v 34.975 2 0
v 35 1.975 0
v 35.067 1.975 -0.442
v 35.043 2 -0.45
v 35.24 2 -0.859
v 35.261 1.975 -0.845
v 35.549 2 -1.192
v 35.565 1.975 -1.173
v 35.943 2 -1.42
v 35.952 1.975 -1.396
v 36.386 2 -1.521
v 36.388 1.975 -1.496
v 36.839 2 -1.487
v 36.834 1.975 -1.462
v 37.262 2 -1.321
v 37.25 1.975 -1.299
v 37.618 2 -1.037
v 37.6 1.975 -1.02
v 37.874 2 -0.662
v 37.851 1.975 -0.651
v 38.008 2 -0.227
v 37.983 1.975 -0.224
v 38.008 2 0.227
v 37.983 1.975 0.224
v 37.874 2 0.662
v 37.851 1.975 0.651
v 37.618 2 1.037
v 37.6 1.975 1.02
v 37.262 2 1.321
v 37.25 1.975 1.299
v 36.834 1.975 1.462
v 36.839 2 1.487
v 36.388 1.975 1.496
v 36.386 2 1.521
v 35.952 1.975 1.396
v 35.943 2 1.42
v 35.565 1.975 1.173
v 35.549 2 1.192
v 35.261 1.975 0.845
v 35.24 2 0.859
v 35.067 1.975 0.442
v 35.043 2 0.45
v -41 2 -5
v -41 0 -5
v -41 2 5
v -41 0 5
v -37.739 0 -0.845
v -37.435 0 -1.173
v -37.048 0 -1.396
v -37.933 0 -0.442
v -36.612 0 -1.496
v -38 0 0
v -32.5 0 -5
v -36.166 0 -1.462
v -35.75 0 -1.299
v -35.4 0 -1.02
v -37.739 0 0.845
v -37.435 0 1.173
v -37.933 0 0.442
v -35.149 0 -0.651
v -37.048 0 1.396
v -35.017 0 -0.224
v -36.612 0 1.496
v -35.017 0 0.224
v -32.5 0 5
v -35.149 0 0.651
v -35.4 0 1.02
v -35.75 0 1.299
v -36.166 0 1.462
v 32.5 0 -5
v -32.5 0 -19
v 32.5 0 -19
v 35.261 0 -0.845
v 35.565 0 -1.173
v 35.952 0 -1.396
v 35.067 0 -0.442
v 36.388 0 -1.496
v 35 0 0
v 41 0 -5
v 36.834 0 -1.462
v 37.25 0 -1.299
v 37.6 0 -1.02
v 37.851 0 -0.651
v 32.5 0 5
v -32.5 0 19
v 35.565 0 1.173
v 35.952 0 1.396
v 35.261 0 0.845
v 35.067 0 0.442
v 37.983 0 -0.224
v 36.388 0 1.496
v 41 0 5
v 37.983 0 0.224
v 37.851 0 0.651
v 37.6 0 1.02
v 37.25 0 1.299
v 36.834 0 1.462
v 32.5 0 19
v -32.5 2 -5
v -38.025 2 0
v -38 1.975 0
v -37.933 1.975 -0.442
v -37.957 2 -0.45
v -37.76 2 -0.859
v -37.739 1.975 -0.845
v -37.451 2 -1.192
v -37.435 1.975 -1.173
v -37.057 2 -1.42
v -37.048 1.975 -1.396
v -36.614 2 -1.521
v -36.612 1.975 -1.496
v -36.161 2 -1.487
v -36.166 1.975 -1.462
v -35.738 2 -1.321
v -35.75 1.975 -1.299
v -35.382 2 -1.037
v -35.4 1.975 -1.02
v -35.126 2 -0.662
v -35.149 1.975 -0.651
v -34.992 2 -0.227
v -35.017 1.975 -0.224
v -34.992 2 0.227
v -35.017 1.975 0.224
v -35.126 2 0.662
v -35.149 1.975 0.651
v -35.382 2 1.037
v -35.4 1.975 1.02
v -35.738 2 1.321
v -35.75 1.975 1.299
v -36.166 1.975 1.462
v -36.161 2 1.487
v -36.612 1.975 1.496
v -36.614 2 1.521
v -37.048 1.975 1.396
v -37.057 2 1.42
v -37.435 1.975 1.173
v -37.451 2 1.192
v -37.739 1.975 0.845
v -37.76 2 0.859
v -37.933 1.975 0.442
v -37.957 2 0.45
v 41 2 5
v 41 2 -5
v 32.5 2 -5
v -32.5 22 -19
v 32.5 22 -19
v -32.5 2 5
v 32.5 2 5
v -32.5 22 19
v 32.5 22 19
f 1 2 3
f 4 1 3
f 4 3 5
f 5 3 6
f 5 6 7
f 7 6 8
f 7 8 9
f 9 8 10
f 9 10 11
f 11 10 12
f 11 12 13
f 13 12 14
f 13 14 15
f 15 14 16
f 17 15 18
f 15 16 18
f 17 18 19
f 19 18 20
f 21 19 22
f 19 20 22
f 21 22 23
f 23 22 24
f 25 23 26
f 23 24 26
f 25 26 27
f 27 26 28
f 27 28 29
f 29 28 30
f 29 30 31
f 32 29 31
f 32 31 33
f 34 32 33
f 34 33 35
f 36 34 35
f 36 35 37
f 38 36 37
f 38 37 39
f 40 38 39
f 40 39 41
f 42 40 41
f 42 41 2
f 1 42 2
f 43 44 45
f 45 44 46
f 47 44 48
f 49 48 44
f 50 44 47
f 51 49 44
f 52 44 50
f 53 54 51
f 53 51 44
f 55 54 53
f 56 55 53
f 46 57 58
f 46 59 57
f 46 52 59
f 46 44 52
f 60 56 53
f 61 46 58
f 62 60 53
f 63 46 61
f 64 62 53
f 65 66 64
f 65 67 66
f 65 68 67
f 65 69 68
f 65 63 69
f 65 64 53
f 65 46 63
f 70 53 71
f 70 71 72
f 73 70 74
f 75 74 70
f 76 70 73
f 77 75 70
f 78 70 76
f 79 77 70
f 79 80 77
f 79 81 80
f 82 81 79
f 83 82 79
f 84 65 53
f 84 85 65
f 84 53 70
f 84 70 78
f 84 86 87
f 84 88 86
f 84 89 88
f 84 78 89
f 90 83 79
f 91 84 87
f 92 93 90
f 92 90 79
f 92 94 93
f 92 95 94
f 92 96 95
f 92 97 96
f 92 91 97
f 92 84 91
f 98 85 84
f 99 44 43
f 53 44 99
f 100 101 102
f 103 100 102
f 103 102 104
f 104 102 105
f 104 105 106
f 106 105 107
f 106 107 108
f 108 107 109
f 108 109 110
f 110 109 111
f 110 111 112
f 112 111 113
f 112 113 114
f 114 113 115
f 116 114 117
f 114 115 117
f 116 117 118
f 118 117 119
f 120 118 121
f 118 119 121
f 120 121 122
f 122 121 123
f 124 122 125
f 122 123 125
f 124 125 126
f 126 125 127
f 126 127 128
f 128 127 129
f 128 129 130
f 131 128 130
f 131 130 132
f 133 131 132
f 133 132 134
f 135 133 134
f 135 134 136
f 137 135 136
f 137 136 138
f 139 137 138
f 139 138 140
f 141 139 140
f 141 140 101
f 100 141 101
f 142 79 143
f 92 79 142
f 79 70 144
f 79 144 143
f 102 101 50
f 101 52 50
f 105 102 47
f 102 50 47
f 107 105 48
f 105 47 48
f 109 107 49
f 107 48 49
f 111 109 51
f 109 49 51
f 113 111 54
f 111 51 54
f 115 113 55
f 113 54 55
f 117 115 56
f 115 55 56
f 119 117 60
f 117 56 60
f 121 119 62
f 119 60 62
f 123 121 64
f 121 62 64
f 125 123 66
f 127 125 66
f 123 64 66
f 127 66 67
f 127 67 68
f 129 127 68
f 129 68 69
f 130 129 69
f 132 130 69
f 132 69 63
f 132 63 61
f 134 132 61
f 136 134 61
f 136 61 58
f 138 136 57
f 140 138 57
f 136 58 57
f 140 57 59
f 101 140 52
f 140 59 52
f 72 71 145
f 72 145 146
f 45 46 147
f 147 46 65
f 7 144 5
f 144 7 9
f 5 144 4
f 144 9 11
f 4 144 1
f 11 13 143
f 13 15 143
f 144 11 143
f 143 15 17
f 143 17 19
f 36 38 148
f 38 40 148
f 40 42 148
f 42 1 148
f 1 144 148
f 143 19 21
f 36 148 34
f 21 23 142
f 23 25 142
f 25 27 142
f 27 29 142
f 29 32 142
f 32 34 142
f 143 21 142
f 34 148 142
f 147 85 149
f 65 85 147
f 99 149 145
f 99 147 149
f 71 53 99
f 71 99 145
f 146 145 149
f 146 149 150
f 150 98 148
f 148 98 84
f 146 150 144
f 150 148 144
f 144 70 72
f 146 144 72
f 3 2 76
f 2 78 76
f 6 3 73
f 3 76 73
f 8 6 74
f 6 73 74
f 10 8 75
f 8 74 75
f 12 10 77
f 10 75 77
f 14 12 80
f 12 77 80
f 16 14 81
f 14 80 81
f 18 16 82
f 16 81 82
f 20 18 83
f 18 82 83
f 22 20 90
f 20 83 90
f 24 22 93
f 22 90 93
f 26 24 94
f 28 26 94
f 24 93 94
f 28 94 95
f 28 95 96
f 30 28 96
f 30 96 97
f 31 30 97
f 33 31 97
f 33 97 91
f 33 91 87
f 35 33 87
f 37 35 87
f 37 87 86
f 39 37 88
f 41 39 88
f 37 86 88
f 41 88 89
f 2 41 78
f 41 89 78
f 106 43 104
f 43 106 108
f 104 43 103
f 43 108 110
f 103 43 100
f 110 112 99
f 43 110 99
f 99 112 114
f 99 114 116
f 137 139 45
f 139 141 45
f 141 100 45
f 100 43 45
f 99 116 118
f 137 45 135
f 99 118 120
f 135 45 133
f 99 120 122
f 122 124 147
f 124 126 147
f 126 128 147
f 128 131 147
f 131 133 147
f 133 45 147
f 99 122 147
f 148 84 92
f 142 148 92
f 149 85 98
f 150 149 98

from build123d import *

# Parameters (mm, degrees)
SKETCH1_W                          = 65
SKETCH1_H                          = 38
BOSS_EXTRUDE1_DEPTH                = 22
SKETCH2_W                          = 82
SKETCH2_H                          = 10
BOSS_EXTRUDE2_DEPTH                = 2
F_3_0_3_DIAMETER_HOLE1_D           = 3
F_3_0_3_DIAMETER_HOLE1_CSINK_D     = 3.05
F_3_0_3_DIAMETER_HOLE1_CSINK_ANGLE = 90


with BuildPart() as part:
    # Sketch1 → Boss-Extrude1 (new body)
    with BuildSketch(Plane(origin=(0, 0, 0), x_dir=(1, 0, 0), z_dir=(0, 1, 0))):
        Rectangle(SKETCH1_W, SKETCH1_H)
    extrude(amount=BOSS_EXTRUDE1_DEPTH)

    # Sketch2 → Boss-Extrude2 (add)
    with BuildSketch(Plane.XZ):
        Rectangle(SKETCH2_W, SKETCH2_H)
    extrude(amount=-BOSS_EXTRUDE2_DEPTH)

    # Ø3.0 (3) Diameter Hole1 (through all)
    with Locations(Plane(origin=(0, 2, 0), x_dir=(1, 0, 0), z_dir=(0, 1, 0))):
        with Locations((-36.5, 0), (36.5, 0)):
            CounterSinkHole(F_3_0_3_DIAMETER_HOLE1_D / 2, F_3_0_3_DIAMETER_HOLE1_CSINK_D / 2, counter_sink_angle=F_3_0_3_DIAMETER_HOLE1_CSINK_ANGLE)


solid = part.part
